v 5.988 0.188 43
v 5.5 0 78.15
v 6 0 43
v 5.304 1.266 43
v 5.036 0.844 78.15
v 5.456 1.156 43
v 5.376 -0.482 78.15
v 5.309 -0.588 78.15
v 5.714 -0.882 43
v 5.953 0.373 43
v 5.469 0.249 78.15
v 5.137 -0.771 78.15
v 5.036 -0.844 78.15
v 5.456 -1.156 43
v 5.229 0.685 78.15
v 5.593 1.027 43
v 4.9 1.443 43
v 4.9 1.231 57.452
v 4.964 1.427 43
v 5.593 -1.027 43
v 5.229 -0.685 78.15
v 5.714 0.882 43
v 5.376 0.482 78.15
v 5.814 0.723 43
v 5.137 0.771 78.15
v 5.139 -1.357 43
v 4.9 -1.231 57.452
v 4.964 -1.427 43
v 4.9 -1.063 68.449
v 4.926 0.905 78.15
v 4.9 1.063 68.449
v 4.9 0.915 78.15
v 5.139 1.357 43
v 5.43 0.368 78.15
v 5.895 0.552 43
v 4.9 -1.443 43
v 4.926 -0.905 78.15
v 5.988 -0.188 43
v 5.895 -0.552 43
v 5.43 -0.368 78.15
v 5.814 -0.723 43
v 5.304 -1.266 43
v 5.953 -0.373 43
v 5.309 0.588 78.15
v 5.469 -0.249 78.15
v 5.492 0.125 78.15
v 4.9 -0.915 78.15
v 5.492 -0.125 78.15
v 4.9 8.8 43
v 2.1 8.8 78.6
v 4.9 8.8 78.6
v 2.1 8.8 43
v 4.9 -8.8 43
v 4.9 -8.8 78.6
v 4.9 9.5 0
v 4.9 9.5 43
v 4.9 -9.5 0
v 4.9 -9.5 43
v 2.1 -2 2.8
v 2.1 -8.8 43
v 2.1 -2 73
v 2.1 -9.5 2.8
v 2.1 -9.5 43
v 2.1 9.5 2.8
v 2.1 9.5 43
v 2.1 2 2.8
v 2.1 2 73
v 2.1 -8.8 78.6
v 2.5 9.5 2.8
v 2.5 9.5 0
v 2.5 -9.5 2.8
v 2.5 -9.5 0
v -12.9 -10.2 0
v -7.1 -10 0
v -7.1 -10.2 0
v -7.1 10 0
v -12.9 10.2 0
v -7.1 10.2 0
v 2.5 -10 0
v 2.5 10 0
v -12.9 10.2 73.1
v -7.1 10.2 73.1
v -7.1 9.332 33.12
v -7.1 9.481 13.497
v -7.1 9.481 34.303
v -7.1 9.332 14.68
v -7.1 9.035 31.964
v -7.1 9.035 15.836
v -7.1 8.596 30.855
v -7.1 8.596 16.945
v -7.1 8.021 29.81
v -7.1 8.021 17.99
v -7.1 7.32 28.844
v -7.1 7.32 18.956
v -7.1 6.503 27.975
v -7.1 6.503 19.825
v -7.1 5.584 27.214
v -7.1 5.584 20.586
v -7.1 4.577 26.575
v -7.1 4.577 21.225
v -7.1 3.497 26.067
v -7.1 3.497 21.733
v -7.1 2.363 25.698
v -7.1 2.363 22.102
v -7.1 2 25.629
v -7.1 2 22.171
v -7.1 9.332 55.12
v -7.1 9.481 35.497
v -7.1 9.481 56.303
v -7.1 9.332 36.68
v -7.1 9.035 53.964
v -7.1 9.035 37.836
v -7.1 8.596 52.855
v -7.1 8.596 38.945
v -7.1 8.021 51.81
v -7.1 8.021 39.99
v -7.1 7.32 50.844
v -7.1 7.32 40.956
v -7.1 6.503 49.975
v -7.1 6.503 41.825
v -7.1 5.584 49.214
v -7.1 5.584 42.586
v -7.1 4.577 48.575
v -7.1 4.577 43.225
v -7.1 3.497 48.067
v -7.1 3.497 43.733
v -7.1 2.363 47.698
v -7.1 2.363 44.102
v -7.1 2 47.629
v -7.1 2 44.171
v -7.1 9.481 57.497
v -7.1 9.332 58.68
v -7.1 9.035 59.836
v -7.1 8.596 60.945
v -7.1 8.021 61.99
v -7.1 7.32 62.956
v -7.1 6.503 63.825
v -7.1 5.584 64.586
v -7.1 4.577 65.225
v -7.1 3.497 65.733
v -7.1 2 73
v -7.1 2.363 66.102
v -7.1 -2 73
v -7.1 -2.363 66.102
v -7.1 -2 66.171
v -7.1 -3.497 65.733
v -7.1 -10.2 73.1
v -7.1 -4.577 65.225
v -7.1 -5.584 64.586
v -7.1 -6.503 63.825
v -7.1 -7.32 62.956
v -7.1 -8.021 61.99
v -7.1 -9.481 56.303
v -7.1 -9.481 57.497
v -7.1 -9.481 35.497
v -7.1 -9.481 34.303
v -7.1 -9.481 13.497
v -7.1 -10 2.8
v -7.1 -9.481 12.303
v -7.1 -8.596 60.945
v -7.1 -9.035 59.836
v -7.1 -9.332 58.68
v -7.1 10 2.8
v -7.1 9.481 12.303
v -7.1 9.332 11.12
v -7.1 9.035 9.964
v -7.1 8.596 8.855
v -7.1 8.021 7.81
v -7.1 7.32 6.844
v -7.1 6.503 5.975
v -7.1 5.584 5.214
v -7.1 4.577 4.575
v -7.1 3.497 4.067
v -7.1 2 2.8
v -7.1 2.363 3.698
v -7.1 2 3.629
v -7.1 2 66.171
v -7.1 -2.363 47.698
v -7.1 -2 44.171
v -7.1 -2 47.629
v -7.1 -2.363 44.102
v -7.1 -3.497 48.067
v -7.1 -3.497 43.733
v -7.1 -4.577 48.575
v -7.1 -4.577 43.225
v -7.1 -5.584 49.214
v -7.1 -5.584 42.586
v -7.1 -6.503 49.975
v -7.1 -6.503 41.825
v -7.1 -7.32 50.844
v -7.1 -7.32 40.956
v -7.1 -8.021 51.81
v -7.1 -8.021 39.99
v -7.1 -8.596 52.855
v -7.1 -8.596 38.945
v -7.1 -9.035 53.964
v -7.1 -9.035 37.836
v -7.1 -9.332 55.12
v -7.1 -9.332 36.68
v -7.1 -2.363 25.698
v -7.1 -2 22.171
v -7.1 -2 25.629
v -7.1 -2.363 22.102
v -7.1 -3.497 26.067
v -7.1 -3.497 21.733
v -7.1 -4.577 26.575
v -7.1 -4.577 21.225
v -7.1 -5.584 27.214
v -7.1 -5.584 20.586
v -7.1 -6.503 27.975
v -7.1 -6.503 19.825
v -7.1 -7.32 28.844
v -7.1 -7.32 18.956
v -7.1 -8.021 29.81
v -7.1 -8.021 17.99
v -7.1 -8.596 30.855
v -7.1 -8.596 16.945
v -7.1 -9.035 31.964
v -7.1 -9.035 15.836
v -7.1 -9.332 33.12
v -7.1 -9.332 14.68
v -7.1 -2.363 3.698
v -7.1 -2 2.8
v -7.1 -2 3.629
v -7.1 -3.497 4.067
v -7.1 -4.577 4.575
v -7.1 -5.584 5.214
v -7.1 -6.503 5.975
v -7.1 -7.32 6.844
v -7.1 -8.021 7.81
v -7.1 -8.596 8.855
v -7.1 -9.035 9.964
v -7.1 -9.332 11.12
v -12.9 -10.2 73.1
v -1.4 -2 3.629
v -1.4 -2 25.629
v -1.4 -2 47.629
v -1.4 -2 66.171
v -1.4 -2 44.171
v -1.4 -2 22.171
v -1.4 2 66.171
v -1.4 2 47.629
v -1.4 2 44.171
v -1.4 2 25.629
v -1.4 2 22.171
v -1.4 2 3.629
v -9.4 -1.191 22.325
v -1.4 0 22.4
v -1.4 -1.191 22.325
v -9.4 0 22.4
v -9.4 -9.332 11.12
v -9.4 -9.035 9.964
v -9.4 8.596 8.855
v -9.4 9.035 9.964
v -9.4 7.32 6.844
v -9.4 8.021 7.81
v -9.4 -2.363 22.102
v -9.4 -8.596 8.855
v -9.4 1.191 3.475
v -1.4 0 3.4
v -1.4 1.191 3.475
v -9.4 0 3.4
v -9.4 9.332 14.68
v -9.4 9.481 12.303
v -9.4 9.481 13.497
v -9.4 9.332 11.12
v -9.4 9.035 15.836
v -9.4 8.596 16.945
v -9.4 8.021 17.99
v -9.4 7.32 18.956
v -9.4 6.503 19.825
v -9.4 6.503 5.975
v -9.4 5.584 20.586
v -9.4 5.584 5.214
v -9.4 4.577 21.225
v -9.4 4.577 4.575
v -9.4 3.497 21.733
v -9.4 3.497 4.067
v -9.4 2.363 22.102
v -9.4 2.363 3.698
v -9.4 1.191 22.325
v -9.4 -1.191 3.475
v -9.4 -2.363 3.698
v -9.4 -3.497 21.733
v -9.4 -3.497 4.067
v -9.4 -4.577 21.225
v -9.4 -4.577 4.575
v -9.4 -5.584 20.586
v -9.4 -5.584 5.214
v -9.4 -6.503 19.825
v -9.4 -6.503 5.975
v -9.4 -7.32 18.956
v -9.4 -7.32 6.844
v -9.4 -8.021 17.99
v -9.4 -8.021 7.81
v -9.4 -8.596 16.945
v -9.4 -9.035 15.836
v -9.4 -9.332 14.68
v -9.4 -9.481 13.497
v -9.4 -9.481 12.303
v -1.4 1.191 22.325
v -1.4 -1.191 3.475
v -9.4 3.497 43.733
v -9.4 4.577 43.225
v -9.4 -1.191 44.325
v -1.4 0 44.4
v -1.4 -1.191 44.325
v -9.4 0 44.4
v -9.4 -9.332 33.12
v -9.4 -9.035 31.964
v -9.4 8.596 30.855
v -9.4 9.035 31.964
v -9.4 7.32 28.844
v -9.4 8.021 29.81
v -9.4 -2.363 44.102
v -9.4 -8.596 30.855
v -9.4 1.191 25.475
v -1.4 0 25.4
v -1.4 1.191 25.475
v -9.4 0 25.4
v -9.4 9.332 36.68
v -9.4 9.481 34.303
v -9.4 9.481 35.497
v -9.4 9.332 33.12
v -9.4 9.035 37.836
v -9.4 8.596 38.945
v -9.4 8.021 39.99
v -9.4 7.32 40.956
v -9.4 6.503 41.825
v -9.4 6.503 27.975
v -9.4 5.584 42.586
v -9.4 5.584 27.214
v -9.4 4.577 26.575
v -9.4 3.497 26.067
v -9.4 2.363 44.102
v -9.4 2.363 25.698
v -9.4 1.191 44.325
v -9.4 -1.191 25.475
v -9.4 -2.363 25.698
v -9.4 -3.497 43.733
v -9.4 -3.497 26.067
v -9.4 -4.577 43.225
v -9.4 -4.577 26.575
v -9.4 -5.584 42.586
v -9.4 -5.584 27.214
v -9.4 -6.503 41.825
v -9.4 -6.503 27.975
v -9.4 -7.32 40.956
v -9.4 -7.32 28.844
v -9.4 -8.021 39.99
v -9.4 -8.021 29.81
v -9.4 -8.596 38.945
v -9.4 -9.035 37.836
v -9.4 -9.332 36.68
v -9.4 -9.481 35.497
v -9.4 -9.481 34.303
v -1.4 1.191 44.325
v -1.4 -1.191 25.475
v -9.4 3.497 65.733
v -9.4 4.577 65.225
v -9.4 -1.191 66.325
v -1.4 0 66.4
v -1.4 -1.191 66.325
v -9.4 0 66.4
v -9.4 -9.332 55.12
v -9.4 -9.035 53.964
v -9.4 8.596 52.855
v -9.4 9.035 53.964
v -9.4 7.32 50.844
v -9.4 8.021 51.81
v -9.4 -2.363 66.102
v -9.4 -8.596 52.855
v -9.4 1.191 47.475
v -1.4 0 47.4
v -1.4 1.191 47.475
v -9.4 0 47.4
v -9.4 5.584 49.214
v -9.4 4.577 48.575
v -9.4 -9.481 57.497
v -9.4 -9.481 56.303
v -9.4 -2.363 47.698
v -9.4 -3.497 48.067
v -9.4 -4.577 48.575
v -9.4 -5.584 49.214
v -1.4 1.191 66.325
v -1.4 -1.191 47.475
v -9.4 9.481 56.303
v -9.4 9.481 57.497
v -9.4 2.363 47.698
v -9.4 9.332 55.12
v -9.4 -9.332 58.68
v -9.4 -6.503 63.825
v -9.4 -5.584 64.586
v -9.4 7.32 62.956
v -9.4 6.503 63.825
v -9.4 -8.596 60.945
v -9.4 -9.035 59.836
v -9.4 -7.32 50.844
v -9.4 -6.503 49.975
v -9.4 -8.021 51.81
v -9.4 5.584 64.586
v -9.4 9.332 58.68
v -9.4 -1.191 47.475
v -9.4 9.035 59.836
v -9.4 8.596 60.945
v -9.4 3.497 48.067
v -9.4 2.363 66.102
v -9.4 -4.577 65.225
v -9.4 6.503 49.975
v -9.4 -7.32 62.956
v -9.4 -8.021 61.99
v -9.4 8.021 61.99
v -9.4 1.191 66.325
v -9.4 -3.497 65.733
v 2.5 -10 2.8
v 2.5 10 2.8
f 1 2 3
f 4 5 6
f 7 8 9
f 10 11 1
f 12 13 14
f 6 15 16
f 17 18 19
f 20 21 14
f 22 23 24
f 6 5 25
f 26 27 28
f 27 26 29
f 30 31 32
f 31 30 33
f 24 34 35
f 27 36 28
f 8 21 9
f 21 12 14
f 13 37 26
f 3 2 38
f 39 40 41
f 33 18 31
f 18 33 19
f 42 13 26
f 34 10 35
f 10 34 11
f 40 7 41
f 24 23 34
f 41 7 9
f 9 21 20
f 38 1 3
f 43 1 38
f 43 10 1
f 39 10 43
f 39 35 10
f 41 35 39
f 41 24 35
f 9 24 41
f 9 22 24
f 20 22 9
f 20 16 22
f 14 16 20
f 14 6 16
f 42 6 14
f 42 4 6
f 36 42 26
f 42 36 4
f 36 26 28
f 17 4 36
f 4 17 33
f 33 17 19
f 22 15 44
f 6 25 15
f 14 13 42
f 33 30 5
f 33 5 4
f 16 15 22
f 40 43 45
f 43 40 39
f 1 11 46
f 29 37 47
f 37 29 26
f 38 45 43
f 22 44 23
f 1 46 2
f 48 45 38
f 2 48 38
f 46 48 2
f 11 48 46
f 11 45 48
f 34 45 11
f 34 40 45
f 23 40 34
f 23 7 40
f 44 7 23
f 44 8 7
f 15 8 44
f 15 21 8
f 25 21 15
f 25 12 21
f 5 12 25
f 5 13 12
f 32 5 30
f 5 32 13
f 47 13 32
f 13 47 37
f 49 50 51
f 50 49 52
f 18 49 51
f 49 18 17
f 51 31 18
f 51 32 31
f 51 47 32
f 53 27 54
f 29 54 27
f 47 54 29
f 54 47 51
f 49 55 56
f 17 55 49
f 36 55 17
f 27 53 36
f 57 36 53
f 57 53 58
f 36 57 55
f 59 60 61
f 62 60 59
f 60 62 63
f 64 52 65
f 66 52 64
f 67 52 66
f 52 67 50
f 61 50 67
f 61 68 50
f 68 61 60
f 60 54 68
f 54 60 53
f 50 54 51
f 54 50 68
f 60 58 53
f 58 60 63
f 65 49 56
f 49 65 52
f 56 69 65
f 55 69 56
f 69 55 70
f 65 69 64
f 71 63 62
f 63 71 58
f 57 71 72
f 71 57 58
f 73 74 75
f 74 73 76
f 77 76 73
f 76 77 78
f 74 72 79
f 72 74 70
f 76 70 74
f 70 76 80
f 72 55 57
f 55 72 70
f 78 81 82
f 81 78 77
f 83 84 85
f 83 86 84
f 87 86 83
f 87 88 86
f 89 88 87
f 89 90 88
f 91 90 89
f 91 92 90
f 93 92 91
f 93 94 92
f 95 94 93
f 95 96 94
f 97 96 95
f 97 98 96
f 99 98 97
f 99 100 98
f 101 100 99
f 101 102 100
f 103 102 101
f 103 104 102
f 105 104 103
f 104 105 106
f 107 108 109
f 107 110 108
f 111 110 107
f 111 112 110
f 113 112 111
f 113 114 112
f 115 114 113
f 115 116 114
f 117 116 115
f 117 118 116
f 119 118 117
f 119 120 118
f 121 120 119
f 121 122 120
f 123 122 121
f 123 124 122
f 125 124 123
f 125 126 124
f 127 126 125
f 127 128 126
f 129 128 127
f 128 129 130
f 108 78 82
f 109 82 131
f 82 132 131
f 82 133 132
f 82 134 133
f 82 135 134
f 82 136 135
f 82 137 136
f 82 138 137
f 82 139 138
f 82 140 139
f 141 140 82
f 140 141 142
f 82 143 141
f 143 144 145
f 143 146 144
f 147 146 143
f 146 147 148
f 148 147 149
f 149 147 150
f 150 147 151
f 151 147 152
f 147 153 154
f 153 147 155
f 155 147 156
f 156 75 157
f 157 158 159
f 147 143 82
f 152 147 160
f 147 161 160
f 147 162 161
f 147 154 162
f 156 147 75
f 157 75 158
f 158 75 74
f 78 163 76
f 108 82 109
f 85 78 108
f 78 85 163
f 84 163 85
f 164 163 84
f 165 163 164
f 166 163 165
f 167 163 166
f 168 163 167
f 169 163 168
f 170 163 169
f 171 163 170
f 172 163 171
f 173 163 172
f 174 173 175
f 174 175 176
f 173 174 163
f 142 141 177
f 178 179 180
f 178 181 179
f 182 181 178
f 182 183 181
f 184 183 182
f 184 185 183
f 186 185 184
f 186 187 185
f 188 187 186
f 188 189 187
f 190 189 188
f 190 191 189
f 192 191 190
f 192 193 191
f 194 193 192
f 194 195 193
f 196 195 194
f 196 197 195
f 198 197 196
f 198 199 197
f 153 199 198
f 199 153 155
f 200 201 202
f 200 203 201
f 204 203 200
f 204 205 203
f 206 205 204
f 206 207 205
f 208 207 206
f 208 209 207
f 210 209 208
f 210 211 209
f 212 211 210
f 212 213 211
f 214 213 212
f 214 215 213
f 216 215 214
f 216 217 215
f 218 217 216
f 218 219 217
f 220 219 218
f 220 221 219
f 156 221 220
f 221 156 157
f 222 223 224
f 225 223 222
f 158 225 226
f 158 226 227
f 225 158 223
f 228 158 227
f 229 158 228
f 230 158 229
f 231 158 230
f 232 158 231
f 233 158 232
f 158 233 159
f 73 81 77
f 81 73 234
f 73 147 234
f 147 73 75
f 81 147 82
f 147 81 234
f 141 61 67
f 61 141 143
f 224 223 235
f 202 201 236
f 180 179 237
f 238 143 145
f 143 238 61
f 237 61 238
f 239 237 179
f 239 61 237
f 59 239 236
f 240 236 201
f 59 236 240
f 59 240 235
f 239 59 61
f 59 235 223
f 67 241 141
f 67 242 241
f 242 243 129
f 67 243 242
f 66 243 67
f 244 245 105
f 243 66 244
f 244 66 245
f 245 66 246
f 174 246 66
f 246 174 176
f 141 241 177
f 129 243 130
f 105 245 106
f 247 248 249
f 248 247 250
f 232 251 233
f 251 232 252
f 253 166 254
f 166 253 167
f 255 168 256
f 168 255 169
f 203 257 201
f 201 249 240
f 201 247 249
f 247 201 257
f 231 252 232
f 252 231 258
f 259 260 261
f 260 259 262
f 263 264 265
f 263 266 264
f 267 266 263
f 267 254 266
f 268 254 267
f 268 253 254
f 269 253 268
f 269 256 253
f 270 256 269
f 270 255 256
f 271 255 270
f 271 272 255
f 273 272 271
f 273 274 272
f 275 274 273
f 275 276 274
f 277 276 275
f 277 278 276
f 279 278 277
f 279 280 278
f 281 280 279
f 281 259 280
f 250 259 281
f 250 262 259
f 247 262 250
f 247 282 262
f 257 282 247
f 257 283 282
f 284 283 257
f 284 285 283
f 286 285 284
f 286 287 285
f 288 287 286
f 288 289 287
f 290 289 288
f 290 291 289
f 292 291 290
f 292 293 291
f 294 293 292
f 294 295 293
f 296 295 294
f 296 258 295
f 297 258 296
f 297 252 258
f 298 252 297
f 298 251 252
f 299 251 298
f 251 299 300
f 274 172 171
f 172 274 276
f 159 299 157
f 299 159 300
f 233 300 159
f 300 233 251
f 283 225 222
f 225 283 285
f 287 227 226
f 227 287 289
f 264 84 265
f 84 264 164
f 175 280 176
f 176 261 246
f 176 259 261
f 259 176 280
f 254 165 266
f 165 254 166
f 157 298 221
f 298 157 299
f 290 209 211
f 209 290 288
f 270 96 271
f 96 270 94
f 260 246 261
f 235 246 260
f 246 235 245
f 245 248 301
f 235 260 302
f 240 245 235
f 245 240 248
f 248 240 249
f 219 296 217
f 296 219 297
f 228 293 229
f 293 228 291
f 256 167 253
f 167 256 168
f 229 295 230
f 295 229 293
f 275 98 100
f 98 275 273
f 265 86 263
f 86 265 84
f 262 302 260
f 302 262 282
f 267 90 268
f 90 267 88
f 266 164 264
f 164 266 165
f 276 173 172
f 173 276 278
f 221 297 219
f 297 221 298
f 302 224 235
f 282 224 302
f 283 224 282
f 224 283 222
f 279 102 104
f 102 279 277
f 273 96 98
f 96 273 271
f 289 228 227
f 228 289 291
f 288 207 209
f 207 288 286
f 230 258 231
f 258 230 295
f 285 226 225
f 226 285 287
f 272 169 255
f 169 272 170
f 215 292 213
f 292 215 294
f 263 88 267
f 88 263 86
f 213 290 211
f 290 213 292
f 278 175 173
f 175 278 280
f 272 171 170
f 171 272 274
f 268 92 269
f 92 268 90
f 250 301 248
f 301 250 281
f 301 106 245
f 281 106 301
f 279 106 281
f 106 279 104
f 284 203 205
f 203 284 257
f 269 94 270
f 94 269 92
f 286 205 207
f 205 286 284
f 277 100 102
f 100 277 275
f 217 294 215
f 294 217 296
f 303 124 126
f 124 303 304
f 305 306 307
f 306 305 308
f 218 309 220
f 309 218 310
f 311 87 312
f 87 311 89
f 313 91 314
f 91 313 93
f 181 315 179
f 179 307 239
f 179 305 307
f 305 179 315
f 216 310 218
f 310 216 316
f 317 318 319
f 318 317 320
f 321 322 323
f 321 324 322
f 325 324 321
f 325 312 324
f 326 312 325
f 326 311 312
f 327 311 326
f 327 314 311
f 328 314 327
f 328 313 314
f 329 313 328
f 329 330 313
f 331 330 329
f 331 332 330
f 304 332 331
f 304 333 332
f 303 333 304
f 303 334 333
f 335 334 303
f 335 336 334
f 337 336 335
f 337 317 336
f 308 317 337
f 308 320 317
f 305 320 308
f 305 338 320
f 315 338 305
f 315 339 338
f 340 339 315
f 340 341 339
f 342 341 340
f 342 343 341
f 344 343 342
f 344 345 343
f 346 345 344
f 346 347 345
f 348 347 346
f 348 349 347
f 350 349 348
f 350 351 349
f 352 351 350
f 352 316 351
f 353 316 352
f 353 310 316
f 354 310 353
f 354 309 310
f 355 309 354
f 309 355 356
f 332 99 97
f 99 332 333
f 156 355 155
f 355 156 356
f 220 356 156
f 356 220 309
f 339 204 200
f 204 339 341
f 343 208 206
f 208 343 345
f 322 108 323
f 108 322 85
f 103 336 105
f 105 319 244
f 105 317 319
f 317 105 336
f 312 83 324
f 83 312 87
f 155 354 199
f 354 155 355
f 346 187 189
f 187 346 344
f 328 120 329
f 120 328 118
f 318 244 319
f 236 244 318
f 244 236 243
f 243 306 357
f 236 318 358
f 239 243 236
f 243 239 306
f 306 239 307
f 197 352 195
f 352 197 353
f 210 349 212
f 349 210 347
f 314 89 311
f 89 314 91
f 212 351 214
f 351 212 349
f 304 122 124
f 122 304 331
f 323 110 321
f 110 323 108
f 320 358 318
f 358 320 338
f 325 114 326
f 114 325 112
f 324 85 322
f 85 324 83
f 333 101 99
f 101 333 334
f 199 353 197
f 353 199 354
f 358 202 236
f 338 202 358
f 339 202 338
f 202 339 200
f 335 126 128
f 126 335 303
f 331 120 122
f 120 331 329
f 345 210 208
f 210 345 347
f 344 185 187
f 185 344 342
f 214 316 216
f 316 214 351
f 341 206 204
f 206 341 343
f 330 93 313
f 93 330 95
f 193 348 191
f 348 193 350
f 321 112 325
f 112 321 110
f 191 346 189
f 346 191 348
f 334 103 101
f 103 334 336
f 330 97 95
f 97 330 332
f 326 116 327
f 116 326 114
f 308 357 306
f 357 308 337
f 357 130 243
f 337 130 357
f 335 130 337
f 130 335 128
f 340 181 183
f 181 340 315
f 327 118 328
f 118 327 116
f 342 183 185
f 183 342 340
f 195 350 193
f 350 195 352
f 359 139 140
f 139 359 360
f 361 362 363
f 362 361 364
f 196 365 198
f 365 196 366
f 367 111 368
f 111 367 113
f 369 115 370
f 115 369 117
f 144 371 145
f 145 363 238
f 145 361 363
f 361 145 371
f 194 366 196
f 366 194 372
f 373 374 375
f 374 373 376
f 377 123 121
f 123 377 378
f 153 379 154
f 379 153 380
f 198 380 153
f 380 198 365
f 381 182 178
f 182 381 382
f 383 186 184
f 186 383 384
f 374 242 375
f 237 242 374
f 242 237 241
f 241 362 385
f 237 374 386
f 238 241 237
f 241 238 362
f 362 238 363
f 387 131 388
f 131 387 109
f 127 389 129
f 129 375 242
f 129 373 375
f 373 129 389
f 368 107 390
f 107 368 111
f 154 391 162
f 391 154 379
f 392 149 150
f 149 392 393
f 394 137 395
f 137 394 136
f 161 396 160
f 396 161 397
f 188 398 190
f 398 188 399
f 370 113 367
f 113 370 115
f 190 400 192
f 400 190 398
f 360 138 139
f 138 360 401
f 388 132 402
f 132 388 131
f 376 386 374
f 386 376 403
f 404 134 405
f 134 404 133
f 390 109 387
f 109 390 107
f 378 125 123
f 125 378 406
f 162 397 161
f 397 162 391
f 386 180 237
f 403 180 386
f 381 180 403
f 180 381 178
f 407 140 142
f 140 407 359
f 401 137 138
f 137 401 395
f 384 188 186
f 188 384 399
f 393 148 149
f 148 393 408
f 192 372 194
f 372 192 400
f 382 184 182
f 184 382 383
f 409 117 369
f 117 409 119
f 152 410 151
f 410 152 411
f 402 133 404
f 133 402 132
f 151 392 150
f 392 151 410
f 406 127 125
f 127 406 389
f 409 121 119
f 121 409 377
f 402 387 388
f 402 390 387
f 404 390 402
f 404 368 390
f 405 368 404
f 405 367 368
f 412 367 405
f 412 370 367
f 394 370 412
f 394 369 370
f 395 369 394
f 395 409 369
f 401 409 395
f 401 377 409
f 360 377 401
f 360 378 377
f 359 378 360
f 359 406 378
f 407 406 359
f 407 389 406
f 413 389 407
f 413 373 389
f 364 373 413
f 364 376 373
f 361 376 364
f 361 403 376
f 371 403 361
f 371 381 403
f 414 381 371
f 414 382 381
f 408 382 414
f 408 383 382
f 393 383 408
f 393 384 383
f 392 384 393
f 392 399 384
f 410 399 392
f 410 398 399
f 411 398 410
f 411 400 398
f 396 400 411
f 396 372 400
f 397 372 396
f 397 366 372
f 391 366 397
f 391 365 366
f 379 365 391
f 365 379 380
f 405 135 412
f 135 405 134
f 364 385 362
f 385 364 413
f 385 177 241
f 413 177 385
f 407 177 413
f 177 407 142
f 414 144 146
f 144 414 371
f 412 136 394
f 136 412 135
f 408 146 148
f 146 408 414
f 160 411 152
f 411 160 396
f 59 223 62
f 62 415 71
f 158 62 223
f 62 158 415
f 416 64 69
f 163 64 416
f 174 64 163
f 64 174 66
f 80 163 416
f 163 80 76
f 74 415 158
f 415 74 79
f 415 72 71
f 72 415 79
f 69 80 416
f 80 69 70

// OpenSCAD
/*

*/
//magnet_bed();
drzak_A();

module magnet_bed(dia=19){
    
    diff=3;
    
    color ("Blue") translate([0,0,0]) rotate ([0,90,0]) cylinder(h=8, d=dia, center=true, $fn=50);
    color ("Blue") translate([0,0,dia+diff]) rotate ([0,90,0]) cylinder(h=8, d=dia, center=true, $fn=50);
    color ("Blue") translate([0,0,2*(dia+diff)]) rotate ([0,90,0]) cylinder(h=8, d=dia, center=true, $fn=50);
}//

module uchyt_repra(delka_rovneho_segmentu=20, delka_sikmeho_segmentu=37,sirka=25,tloustka=2.8){
    //delka_rovneho_segmentu=20;
    //delka_sikmeho_segmentu=37;
    //sirka=25;
    //tloustka=2.8;
    // -4 u promenne sirka je tam pro zuzeni, aby to nebylo sirsi nez zakladna
    
    translate([0,0,-0.5*(-delka_rovneho_segmentu+delka_sikmeho_segmentu)]){
        //color ("Lightgreen")translate ([0,(-6-1+sirka)/2,delka_sikmeho_segmentu-tloustka/2]) rotate ([90,0,0]) cylinder(h=sirka-4-3, r=tloustka/2, $fn=50);
        
        //color ("Lightgreen")translate ([0,(-6-1+sirka)/2,-delka_rovneho_segmentu]) rotate ([0,0,90]) cylinder(h=-tloustka/2+delka_sikmeho_segmentu+delka_rovneho_segmentu, r=tloustka/2, $fn=50);
        //color ("Lightgreen")translate ([0,-(-6-1+sirka)/2,0-delka_rovneho_segmentu]) rotate ([0,0,90]) cylinder(h=-tloustka/2+delka_sikmeho_segmentu+delka_rovneho_segmentu, r=tloustka/2, $fn=50);
        
        //color ("Green")translate ([0,(-6-1+sirka)/2,delka_sikmeho_segmentu-tloustka/2]) sphere(r=1*tloustka/2, $fn=50);
        //color ("Green")translate ([0,-(-6-1+sirka)/2,delka_sikmeho_segmentu-tloustka/2]) sphere(r=1*tloustka/2, $fn=50);
        
        color ("Khaki")translate ([1,0,0]) rotate ([0,0,0]) cylinder(h=0.95*delka_sikmeho_segmentu, r1=1.5, r2=1.0, $fn=50);
        color ("Yellow")translate ([0,0,(-0.5*tloustka+delka_sikmeho_segmentu)*0.5]) rotate ([90,0,90]) cube([sirka-6-tloustka/2,delka_sikmeho_segmentu-tloustka/2,tloustka], center=true);    
        color ("Gold")translate ([0,0,-0.5*delka_rovneho_segmentu]) rotate ([90,0,90]) cube([sirka-6/*+3*/,delka_rovneho_segmentu,tloustka], center=true);
    }//center translate
    
}//module

module uchyt_tabule(delka_rovneho_segmentu=20, delka_sikmeho_segmentu=37,sirka=25,tloustka=2.8){
    //delka_rovneho_segmentu=20;
    //delka_sikmeho_segmentu=37;
    //sirka=25;
    //tloustka=2.8;
    // -4 u promenne sirka je tam pro zuzeni, aby to nebylo sirsi nez zakladna
    
    
    
    
    translate([0,0,-0.5*(-delka_rovneho_segmentu+delka_sikmeho_segmentu)]){
        //color ("Lightgreen")translate ([0,(-6-1+sirka)/2,delka_sikmeho_segmentu-tloustka/2]) rotate ([90,0,0]) cylinder(h=sirka-4-3, r=tloustka/2, $fn=50);
        
        //color ("Lightgreen")translate ([0,(-6-1+sirka)/2,-delka_rovneho_segmentu]) rotate ([0,0,90]) cylinder(h=-tloustka/2+delka_sikmeho_segmentu+delka_rovneho_segmentu, r=tloustka/2, $fn=50);
        //color ("Lightgreen")translate ([0,-(-6-1+sirka)/2,0-delka_rovneho_segmentu]) rotate ([0,0,90]) cylinder(h=-tloustka/2+delka_sikmeho_segmentu+delka_rovneho_segmentu, r=tloustka/2, $fn=50);
        
        //color ("Green")translate ([0,(-6-1+sirka)/2,delka_sikmeho_segmentu-tloustka/2]) sphere(r=1*tloustka/2, $fn=50);
        //color ("Green")translate ([0,-(-6-1+sirka)/2,delka_sikmeho_segmentu-tloustka/2]) sphere(r=1*tloustka/2, $fn=50);
        
        //color ("Khaki")translate ([1,0,0]) rotate ([0,0,0]) cylinder(h=0.95*delka_sikmeho_segmentu, r1=1.5, r2=1.0, $fn=50);
        color ("Yellow")translate ([0,0,(-0.5*tloustka+delka_sikmeho_segmentu)*0.5]) rotate ([90,0,90]) cube([sirka-6 /*-tloustka/2*/,delka_sikmeho_segmentu-tloustka/2,tloustka], center=true);    
        color ("Gold")translate ([0,0,-0.5*delka_rovneho_segmentu]) rotate ([90,0,90]) cube([sirka-6/*+3*/,delka_rovneho_segmentu,tloustka], center=true);
    }//center translate
    
}//module

module drzak_A(){
    
    uchyt_delka_rovneho_segmentu=29;
    uchyt_delka_sikmeho_segmentu=37;
    uchyt_sirka=25;
    uchyt_tloustka=2.8;

    //podpera
/*
difference(){*/
    
    /*color("grey")  translate([0,0,-8-0.5*uchyt_tloustka]) rotate([0,0,0]) cube([60,40,23], center=true);
    }*/
    
    //to co se bude lepit ke stolu
    translate([-5,0,uchyt_tloustka*0.5]) rotate([0,0,90]) cube([/*uchyt_sirka*/ 20 ,15,uchyt_tloustka], center=true);
    
    //samotna uchytka
    prodlouzeni=14;
    translate([3.5,0,prodlouzeni/2+0.5*uchyt_delka_rovneho_segmentu+0.5*uchyt_delka_sikmeho_segmentu])
        uchyt_repra(delka_rovneho_segmentu=prodlouzeni+uchyt_delka_rovneho_segmentu,
        delka_sikmeho_segmentu=uchyt_delka_sikmeho_segmentu,
        sirka=uchyt_sirka,
        tloustka=uchyt_tloustka);

 
    //kus pro magnet
    difference(){
    prodlouzeni=10;
    uchyt_sirka=26.4;    
        union(){
            color ("green") translate([-02.8,0,37]) rotate([90,90,0]) cube([72,10,4], center=true);
            translate([-10,0,0.5*prodlouzeni+0.5*uchyt_delka_rovneho_segmentu+0.5*uchyt_delka_sikmeho_segmentu])
            uchyt_tabule(delka_rovneho_segmentu=prodlouzeni+uchyt_delka_rovneho_segmentu,delka_sikmeho_segmentu=uchyt_delka_sikmeho_segmentu,sirka=uchyt_sirka,tloustka=3+uchyt_tloustka);
            }//union
    translate([-5.4,0,12.9]) magnet_bed();
    }//diff
//translate([-9,0,30]) magnet_bed();
        
    //infotexty
    //color("black") rotate([0,0,0]) translate([2,3,uchyt_tloustka]) linear_extrude(1) text(text=str("DES.VER.4"), size=5);
    //color("black") rotate([0,0,0]) translate([2,-8,uchyt_tloustka]) linear_extrude(1) text(text=str("CEILING -->"), size=5);
    }//module




module drzak_B(){ }//mod
